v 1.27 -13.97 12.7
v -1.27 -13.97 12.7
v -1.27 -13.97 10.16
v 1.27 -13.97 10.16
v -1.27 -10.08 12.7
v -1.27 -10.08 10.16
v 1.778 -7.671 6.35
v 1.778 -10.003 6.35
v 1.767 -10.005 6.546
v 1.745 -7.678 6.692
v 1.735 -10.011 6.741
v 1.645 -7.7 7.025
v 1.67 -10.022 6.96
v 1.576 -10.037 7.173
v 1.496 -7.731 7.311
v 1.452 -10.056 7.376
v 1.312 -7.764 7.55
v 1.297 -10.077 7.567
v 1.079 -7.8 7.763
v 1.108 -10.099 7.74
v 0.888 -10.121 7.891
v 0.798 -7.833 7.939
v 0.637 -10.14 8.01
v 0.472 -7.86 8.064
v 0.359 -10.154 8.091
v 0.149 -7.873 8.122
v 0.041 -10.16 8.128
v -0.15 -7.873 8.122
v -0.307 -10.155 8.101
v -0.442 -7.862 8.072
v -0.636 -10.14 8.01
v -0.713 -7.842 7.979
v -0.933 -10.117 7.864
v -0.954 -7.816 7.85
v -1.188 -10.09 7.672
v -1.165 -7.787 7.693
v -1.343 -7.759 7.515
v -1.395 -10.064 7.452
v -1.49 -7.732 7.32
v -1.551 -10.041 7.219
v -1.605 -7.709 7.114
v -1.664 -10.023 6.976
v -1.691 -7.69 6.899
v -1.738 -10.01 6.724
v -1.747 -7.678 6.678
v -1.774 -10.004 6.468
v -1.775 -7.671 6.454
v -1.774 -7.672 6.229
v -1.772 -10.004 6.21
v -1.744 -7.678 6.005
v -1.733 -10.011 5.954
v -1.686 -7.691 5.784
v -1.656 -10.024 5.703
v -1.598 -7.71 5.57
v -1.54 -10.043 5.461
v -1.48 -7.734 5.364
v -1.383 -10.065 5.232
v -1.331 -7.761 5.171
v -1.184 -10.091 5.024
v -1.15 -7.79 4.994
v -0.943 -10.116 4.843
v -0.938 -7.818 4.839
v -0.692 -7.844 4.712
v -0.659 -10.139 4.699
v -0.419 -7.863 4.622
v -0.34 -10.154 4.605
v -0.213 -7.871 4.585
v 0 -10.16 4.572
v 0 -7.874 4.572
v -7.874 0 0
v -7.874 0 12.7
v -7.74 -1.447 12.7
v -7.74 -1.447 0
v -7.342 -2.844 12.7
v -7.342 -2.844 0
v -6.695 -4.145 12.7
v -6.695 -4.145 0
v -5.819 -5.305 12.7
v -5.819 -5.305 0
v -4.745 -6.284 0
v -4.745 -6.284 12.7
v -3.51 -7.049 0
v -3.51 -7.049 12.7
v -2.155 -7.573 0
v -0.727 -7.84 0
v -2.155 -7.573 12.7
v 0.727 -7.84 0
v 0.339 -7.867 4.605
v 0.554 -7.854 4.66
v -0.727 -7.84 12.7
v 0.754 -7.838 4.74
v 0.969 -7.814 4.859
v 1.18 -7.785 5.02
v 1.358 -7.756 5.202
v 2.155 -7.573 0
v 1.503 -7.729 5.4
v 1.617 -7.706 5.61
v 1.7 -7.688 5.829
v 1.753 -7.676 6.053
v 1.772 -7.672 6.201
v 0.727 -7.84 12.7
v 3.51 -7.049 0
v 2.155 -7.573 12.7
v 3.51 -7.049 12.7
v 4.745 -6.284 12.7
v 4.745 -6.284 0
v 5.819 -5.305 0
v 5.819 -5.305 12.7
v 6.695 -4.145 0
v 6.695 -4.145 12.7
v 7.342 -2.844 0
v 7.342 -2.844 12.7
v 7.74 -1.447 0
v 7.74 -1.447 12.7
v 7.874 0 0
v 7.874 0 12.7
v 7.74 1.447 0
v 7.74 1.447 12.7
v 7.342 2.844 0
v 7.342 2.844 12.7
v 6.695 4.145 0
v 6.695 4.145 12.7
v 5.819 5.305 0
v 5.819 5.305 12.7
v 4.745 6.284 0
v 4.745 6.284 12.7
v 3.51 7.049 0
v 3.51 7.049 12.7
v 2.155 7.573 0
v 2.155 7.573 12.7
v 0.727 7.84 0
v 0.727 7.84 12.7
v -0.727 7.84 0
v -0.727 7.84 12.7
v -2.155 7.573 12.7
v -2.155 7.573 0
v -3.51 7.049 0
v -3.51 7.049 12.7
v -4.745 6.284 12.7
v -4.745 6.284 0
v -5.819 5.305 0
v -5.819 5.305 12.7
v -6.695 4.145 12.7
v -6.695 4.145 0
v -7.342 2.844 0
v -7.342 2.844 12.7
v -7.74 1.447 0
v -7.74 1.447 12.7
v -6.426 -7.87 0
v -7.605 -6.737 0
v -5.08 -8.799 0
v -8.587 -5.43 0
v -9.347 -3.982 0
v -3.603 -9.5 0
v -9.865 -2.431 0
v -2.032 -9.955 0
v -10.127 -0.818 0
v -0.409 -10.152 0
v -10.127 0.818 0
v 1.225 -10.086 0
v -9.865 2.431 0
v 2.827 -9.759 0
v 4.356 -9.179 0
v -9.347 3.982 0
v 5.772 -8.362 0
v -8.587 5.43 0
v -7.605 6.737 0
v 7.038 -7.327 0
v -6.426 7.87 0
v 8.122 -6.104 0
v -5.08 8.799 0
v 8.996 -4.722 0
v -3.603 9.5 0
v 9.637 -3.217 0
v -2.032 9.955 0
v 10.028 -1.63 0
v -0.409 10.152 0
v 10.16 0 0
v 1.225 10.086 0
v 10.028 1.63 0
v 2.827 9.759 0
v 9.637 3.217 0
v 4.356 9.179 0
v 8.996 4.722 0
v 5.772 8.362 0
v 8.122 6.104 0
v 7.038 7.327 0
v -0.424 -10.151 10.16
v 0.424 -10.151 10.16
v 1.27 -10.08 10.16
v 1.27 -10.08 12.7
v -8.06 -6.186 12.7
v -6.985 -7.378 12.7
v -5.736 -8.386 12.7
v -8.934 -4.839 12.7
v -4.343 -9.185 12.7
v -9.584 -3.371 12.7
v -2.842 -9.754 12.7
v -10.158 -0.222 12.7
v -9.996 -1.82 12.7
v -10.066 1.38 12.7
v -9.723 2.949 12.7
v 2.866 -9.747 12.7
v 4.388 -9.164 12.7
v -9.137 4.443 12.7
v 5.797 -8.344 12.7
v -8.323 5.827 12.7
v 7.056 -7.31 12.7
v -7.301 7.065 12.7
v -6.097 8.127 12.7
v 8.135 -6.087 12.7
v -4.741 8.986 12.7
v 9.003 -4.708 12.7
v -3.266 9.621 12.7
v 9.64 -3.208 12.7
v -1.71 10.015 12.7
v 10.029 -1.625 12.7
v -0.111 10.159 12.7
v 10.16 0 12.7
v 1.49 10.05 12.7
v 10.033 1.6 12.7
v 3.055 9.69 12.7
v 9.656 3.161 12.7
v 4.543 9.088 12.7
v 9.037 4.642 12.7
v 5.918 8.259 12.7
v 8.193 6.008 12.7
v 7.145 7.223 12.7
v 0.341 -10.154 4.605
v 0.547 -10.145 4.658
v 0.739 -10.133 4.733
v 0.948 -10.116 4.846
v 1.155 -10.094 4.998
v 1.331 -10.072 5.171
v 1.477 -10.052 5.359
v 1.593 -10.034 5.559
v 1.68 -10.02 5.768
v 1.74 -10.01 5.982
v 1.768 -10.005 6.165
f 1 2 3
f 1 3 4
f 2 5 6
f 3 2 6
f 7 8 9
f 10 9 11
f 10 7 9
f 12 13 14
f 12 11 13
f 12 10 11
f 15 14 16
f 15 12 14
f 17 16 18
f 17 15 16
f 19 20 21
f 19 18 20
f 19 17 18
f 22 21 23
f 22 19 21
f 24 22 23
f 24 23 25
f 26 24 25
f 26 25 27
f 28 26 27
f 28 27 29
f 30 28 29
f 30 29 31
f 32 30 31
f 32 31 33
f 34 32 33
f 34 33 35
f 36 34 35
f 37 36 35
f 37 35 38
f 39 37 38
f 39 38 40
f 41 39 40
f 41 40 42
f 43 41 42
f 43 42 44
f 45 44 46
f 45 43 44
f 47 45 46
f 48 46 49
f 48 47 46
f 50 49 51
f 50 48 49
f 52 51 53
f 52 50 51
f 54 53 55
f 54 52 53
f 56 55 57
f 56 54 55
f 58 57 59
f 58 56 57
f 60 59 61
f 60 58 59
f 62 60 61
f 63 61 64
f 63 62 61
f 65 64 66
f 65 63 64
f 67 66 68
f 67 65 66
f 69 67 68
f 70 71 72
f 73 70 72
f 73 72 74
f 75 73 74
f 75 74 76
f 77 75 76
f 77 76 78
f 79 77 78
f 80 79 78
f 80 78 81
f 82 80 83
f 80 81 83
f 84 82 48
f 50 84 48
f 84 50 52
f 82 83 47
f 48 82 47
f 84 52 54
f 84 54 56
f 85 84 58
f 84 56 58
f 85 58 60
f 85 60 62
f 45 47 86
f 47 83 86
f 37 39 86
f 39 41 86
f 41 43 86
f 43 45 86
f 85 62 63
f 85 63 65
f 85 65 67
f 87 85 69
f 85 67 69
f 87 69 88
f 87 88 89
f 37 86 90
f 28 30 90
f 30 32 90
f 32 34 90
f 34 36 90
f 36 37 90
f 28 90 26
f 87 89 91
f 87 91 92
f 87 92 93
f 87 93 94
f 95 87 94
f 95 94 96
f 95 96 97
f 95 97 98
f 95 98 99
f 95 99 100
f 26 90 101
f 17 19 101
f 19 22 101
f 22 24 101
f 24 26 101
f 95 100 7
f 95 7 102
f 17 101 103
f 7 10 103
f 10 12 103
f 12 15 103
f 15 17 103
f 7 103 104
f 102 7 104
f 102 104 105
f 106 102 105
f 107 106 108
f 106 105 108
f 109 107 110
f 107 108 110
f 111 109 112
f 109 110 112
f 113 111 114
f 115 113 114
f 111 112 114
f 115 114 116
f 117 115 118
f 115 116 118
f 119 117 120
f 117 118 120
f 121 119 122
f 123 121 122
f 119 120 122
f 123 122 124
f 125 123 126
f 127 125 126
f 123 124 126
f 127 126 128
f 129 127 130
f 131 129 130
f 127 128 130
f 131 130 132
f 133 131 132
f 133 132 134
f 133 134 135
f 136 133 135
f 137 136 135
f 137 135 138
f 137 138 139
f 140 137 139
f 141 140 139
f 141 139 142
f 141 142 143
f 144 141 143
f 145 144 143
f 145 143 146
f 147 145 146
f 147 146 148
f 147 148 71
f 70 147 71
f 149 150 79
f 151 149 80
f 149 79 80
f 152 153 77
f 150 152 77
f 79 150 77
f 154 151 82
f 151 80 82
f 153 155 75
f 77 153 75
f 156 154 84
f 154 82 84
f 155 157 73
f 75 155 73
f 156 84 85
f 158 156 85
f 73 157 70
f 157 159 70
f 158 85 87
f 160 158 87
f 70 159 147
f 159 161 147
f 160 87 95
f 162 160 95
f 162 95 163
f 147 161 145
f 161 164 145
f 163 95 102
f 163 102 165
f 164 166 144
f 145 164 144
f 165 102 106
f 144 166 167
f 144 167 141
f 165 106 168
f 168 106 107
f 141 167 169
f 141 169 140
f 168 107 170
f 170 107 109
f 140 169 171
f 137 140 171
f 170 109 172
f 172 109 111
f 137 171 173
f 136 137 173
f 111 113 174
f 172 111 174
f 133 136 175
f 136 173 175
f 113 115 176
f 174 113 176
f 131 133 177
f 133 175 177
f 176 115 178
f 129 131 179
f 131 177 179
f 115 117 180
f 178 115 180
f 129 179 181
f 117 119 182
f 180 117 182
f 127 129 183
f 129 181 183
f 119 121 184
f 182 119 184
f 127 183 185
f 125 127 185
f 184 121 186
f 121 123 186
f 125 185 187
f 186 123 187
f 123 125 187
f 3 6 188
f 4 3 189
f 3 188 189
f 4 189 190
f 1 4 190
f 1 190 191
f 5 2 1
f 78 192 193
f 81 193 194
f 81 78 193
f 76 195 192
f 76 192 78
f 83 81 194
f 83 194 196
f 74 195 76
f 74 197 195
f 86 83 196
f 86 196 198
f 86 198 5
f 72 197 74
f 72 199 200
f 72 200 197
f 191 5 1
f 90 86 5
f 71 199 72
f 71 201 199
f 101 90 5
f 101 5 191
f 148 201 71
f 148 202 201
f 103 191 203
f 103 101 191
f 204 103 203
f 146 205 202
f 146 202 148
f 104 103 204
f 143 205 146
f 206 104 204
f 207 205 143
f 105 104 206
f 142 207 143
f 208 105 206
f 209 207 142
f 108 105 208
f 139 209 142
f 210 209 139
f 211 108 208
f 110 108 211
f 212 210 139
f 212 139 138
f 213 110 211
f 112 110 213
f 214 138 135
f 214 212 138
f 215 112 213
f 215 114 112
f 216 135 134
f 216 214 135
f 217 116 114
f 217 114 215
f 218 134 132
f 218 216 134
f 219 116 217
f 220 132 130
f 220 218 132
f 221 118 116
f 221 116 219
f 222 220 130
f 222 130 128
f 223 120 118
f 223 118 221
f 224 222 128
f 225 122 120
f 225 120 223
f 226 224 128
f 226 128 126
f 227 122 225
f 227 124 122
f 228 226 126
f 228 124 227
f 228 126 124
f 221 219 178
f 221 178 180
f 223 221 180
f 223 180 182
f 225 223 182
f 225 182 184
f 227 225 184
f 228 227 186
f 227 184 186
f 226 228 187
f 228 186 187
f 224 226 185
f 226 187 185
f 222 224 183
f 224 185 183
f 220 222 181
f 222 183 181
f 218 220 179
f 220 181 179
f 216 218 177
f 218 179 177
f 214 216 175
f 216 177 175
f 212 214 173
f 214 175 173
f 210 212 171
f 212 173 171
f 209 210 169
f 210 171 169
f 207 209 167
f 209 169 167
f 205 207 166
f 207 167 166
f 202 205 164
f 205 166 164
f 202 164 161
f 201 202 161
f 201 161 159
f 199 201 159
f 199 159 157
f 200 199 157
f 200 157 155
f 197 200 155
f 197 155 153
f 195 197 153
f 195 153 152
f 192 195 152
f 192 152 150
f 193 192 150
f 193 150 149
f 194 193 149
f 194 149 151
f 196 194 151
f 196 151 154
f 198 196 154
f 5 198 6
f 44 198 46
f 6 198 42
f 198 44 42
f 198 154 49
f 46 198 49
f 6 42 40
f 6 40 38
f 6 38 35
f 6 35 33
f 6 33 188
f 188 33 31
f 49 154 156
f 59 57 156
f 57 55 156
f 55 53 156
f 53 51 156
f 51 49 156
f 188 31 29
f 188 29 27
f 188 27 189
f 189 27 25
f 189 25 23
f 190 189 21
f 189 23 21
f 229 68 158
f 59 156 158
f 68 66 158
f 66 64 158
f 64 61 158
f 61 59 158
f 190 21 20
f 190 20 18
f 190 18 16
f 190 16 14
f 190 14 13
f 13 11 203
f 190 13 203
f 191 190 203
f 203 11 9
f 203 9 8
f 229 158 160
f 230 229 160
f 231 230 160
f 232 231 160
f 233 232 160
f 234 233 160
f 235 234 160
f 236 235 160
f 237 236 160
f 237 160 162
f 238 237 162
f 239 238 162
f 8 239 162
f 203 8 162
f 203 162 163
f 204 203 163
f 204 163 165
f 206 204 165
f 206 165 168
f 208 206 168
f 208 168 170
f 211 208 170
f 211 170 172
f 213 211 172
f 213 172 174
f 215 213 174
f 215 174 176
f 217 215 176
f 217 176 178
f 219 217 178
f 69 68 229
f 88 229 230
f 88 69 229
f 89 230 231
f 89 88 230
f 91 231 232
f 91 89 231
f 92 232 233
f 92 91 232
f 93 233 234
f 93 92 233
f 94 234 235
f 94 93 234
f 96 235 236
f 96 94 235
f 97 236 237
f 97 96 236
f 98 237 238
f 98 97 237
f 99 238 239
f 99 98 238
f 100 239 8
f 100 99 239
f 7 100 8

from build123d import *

# Parameters (mm, degrees)
F0_R     = 10.16
F1_DEPTH = 12.7
F3_DEPTH = 13.97
F5_DEPTH = 10.16
F7_D     = 15.748


with BuildPart() as f1:
    # F0 (on Top) → F1 (new body)
    with BuildSketch(Plane.XY):
        Circle(F0_R)
    extrude(amount=F1_DEPTH)

    # F2 (on Front) → F3 (join)
    with BuildSketch(Plane.XZ):
        Polygon((-1.27, 12.7), (-1.27, 10.16), (0, 10.16), (1.27, 10.16), (1.27, 12.7), align=None)
    extrude(amount=F3_DEPTH)

    # F4 (on Front) → F5 (cut, through all)
    with BuildSketch(Plane.XZ):
        with BuildLine():
            ThreePointArc((0, 4.572), (1.257236, 5.092764), (1.778, 6.35))
            ThreePointArc((1.778, 6.35), (-1.257236, 7.607236), (0, 4.572))
        make_face()
    extrude(amount=F5_DEPTH, mode=Mode.SUBTRACT)

    # F7 (through all)
    with Locations(Plane(origin=(0, 0, 0), x_dir=(1, 0, 0), z_dir=(0, 0, -1))):
        with Locations((0, 0)):
            Hole(F7_D / 2)


solid = f1.part
